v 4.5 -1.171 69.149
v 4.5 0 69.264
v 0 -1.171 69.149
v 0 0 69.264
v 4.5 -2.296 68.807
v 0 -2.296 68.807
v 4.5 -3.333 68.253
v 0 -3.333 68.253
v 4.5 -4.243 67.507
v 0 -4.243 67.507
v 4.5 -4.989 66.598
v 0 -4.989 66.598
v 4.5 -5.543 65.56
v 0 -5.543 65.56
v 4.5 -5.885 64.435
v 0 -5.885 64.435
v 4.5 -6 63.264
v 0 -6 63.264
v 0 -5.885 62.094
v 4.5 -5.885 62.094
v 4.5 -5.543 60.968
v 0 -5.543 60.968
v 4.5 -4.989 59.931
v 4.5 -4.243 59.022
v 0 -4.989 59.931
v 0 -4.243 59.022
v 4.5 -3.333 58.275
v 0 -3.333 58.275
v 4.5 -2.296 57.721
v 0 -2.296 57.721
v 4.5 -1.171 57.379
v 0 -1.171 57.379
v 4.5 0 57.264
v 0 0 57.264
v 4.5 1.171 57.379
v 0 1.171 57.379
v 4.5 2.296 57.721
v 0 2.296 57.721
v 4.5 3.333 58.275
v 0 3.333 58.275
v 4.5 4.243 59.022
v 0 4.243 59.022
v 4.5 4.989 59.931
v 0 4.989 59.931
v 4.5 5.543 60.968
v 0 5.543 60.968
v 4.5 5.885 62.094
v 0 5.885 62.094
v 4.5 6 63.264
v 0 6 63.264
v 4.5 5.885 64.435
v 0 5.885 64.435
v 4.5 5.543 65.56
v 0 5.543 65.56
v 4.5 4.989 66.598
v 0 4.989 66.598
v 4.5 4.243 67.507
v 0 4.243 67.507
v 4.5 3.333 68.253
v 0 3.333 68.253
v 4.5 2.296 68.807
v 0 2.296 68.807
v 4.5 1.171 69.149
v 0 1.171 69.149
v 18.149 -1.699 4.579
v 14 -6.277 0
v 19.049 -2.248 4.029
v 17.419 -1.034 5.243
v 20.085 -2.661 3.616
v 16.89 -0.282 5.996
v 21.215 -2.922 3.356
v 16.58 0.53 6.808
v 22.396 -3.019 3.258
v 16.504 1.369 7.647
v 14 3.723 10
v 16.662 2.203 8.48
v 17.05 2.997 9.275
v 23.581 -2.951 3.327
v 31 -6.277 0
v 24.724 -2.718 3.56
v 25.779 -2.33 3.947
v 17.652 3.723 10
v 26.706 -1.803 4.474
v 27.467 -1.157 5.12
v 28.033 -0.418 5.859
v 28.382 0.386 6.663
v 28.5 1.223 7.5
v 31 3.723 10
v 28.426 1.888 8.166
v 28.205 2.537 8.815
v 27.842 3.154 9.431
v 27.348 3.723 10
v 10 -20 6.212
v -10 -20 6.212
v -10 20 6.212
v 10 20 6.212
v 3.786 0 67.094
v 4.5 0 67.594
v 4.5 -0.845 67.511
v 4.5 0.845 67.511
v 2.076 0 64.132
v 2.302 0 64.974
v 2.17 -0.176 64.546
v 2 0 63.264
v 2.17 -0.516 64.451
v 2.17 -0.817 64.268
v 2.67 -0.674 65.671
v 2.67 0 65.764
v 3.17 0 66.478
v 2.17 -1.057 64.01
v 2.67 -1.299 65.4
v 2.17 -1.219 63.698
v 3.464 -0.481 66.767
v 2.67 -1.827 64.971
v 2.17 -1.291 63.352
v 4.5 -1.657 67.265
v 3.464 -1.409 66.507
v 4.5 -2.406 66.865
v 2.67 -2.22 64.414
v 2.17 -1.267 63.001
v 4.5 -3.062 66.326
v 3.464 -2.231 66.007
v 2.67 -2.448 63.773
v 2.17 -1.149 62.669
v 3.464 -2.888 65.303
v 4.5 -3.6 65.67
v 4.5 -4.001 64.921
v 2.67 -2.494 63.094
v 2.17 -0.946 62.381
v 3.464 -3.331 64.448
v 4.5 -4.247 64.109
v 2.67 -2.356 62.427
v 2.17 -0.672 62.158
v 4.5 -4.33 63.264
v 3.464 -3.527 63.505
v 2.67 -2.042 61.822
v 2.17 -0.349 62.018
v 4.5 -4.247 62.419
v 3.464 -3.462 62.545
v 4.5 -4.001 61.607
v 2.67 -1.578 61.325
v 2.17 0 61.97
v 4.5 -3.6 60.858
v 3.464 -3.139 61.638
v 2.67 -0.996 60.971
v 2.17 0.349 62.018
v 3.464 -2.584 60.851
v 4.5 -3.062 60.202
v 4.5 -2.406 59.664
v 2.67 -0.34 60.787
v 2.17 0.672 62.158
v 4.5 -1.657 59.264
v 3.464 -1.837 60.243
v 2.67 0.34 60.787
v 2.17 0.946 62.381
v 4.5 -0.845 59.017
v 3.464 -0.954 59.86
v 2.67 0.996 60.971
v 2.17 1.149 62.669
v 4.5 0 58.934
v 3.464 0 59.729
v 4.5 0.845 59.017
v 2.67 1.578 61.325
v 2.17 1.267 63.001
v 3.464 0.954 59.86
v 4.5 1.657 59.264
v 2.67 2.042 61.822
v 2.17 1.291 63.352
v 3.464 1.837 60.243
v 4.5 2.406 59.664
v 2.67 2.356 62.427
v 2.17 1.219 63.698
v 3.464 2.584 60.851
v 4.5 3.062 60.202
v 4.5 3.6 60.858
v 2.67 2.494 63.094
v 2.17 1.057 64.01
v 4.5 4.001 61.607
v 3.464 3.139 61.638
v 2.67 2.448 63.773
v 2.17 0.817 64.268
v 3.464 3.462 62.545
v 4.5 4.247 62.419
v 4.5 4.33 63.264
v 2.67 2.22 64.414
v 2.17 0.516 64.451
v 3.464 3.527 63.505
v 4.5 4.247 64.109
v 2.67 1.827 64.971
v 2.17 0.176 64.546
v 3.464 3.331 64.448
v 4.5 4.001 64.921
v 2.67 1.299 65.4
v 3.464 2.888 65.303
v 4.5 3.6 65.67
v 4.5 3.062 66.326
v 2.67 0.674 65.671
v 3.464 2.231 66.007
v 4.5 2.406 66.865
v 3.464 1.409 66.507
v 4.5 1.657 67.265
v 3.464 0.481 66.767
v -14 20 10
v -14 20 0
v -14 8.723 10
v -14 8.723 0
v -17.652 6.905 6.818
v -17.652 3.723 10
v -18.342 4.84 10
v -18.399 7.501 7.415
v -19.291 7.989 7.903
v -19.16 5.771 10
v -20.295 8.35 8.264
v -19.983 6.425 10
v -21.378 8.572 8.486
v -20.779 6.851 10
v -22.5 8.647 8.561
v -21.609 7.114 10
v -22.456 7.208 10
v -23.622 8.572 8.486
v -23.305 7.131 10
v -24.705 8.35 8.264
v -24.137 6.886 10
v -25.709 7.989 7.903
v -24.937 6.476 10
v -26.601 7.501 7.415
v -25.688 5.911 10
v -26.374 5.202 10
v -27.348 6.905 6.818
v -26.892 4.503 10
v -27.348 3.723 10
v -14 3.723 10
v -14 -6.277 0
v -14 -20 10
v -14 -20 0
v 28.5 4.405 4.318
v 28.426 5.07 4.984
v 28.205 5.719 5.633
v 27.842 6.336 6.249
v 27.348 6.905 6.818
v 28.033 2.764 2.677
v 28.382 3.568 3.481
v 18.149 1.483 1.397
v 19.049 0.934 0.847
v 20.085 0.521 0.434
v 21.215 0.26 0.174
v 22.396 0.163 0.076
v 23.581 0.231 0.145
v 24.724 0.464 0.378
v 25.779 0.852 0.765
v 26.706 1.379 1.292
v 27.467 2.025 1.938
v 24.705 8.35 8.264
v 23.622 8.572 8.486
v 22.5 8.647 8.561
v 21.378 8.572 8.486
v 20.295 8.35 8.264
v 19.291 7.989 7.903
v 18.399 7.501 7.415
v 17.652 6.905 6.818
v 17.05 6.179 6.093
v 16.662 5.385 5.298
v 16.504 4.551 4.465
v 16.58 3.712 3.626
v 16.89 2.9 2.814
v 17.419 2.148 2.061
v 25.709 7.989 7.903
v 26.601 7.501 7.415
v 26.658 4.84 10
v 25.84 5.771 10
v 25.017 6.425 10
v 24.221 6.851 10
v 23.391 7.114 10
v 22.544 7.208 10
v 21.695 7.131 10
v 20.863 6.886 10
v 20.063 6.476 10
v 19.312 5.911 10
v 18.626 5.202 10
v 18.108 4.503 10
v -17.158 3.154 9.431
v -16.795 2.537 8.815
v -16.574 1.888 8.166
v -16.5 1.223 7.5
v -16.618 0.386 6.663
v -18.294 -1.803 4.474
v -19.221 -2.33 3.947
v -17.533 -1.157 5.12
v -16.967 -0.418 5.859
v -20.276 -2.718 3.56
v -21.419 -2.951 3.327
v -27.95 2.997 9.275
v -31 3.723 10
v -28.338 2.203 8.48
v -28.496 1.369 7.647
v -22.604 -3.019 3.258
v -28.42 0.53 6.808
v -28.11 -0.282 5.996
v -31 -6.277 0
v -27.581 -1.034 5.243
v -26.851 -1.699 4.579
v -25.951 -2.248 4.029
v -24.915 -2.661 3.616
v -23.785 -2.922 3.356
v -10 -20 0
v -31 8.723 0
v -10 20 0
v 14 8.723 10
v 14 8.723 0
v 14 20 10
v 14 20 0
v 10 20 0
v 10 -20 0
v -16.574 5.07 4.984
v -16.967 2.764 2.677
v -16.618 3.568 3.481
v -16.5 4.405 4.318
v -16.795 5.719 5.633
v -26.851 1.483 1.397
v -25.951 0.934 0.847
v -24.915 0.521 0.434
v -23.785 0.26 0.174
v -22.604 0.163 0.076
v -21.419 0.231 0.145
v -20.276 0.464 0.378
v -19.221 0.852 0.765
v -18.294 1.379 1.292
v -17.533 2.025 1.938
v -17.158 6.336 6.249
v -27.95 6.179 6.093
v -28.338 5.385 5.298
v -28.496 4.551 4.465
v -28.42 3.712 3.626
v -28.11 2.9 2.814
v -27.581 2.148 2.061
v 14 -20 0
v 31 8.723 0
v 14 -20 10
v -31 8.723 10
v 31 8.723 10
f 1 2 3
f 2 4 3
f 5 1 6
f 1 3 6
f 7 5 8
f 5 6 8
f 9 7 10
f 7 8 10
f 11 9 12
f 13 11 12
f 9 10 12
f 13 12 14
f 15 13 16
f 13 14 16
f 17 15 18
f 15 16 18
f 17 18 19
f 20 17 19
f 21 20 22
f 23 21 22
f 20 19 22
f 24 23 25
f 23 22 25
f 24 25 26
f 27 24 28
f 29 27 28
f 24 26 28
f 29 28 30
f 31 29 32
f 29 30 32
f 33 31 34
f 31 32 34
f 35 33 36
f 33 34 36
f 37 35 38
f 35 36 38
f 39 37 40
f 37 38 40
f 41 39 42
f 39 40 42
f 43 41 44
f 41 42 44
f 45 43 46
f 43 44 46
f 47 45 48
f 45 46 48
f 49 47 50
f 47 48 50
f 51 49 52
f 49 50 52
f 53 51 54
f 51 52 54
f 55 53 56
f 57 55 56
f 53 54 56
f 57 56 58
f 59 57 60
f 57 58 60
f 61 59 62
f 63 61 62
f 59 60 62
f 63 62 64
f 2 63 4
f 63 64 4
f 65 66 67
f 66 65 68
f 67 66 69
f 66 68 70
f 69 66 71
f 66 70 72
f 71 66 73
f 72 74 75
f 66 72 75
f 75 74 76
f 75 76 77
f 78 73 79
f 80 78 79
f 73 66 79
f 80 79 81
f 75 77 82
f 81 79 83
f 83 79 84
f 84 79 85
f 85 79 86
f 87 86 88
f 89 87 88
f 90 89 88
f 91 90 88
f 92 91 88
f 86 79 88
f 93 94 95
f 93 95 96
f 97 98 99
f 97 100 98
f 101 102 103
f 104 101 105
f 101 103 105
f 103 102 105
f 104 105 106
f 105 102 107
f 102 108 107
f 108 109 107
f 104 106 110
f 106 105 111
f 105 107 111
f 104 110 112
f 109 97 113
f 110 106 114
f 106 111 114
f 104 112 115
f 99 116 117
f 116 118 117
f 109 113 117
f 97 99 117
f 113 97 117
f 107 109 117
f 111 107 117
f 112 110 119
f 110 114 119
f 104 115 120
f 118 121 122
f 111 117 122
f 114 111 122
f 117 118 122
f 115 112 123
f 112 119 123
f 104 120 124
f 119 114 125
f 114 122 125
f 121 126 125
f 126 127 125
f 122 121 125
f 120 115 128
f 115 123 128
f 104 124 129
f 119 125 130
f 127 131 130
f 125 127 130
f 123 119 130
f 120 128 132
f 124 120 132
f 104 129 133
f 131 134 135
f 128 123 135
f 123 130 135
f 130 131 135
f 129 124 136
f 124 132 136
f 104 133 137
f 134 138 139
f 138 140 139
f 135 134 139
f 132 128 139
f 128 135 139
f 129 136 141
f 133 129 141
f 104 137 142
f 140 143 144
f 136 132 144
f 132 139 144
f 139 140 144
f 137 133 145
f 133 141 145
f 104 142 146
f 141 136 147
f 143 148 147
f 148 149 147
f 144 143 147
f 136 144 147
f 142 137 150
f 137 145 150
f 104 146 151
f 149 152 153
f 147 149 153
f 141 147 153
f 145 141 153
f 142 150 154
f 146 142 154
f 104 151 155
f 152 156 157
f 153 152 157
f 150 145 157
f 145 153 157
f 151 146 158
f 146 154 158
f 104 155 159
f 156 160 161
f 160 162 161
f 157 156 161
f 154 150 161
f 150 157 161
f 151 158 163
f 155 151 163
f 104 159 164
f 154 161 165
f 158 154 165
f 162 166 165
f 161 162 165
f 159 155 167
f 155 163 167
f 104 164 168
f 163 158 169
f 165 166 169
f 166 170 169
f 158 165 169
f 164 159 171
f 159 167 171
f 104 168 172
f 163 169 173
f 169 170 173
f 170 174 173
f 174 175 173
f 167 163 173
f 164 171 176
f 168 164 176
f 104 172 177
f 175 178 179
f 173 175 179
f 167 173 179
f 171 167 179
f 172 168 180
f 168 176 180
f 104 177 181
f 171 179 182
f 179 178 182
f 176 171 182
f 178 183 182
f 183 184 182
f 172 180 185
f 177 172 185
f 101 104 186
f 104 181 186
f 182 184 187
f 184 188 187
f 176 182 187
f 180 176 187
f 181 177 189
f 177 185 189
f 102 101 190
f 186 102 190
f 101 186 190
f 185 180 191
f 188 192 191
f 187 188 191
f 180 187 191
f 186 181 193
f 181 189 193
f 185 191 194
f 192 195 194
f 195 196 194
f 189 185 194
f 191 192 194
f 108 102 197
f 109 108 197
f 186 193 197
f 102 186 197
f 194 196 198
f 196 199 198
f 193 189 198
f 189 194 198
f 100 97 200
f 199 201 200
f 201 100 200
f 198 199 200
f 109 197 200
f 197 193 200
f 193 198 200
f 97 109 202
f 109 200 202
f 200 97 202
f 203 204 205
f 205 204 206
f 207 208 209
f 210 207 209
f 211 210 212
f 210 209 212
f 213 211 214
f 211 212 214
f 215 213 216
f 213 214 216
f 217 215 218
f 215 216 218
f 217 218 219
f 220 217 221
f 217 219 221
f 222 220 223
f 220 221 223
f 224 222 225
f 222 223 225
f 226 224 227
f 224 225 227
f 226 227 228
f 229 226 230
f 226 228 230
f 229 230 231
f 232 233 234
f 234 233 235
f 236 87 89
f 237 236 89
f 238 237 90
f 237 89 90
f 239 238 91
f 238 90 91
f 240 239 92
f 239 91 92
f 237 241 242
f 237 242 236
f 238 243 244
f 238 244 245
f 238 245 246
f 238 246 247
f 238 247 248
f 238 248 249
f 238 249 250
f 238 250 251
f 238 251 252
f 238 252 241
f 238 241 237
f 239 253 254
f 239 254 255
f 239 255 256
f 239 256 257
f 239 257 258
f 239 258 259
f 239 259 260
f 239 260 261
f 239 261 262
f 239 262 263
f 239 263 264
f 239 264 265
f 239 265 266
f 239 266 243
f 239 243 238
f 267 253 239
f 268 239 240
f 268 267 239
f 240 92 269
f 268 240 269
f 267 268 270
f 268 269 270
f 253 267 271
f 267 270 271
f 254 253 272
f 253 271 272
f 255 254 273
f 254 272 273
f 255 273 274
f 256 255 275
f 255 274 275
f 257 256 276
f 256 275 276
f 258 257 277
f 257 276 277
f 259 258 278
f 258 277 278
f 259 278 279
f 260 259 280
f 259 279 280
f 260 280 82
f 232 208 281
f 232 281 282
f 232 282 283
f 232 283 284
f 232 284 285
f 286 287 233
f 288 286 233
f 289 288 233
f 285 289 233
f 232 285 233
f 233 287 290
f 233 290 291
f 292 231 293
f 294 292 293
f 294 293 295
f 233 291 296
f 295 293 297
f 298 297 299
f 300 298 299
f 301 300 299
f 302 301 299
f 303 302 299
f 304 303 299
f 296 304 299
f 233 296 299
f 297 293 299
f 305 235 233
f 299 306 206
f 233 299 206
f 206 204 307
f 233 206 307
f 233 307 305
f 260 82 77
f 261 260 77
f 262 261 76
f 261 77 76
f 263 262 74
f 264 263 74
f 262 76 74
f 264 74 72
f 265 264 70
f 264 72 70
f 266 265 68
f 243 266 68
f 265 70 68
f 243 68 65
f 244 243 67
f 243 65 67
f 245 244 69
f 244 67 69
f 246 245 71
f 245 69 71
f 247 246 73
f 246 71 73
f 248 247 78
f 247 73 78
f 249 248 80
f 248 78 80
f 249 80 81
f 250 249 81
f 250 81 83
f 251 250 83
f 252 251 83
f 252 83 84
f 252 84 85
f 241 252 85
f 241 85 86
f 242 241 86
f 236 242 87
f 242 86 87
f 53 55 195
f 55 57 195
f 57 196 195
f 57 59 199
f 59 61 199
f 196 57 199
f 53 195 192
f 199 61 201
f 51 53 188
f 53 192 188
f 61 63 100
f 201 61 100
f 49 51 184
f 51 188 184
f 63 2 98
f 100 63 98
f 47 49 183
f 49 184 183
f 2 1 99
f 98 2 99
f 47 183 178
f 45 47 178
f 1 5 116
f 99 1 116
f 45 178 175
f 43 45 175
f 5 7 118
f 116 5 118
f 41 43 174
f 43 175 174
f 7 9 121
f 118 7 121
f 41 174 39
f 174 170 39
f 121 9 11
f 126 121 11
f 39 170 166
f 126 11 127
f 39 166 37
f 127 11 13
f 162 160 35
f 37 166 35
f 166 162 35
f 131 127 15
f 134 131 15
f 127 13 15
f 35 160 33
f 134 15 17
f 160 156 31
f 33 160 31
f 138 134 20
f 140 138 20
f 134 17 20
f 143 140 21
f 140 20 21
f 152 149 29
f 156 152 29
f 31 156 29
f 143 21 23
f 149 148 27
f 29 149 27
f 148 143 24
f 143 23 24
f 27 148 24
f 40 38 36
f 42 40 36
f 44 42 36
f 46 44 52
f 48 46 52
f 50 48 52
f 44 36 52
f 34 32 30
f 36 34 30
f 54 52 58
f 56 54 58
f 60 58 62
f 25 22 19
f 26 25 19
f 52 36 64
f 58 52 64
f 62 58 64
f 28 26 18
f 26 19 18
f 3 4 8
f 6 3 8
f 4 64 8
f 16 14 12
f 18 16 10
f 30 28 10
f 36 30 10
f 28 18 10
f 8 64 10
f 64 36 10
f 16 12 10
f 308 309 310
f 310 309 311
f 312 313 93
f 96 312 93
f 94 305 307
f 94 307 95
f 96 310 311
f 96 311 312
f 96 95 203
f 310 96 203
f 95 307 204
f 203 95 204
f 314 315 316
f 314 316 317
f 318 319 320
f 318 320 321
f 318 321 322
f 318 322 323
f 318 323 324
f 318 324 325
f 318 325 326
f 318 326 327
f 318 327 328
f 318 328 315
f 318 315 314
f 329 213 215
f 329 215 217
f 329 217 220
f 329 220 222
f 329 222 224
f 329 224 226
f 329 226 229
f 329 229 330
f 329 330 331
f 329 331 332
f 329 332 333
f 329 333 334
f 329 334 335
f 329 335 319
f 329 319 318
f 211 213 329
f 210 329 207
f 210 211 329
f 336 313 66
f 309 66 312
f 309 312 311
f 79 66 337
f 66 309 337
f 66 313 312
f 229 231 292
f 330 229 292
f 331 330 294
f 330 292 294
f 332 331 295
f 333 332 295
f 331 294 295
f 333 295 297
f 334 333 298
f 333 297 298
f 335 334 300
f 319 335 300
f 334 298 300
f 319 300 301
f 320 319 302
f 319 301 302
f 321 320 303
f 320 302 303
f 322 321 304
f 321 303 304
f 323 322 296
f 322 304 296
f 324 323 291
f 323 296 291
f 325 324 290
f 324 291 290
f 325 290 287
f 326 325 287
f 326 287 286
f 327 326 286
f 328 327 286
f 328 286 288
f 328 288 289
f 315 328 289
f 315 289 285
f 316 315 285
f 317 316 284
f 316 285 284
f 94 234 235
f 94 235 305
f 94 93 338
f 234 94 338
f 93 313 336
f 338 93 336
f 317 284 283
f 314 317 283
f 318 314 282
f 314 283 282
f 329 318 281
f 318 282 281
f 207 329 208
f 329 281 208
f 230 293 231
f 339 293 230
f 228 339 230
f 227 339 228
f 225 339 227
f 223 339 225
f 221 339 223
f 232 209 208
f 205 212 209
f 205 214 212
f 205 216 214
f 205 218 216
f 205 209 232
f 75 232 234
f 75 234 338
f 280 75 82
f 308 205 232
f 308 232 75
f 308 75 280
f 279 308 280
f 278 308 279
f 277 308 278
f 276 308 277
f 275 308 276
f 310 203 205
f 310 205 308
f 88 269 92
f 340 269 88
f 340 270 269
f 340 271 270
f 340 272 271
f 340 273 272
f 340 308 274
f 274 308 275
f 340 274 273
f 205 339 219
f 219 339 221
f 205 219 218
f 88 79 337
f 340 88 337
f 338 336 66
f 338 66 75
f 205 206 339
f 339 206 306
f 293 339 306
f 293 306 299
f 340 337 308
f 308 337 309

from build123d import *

# Parameters (mm, degrees)
F1_DEPTH  = 10
F2_W      = 20
F2_H      = 6.2118896035
F3_DEPTH  = 40.001
F5_DEPTH  = 17
F7_DEPTH  = 4.5
F9_DEPTH  = 17
F11_DEPTH = 4.5


with BuildPart() as f1:
    # F0 (on Top) → F1 (new body)
    with BuildSketch(Plane.XY):
        Polygon((14, 8.7225403264), (14, 20), (-14, 20), (-14, 8.7225403264), (-31, 8.7225403264), (-31, -6.2774596736), (-14, -6.2774596736), (-14, -20), (14, -20), (14, -6.2774596736), (31, -6.2774596736), (31, 8.7225403264), align=None)
    extrude(amount=F1_DEPTH)

    # F2 (on face) → F3 (cut, through all)
    with BuildSketch(Plane.XZ.offset(20)):
        with Locations((0, 3.1059448017)):
            Rectangle(F2_W, F2_H)
    extrude(amount=-F3_DEPTH, mode=Mode.SUBTRACT)

    # F4 (on face) → F5 (cut)
    with BuildSketch(Plane.YZ.offset(31)):
        Polygon((-6.2774596736, 10), (-6.2774596736, 0), (1.2225403264, 7.5), (3.7225403264, 10), align=None)
    extrude(amount=-F5_DEPTH, mode=Mode.SUBTRACT)

    # F6 (on face) → F7 (cut)
    with BuildSketch(Plane(origin=(0, -3.1387298368, 3.1387298368), x_dir=(1, 0, 0), z_dir=(0, -0.7071067812, 0.7071067812))):
        with BuildLine():
            ThreePointArc((28.5, 6.1677713199), (28.2046514458, 8.0270593239), (27.3476827061, 9.7033013199))
            Line((27.3476827061, 9.7033013199), (17.6523172939, 9.7033013199))
            ThreePointArc((17.6523172939, 9.7033013199), (20.640711996, 0.4631198741), (28.5, 6.1677713199))
        make_face()
        with BuildLine():
            Line((17.6523172939, 9.7033013199), (27.3476827061, 9.7033013199))
            ThreePointArc((27.3476827061, 9.7033013199), (22.5, 12.1677713199), (17.6523172939, 9.7033013199))
        make_face()
    extrude(amount=-F7_DEPTH, mode=Mode.SUBTRACT)

    # F8 (on face) → F9 (cut)
    with BuildSketch(Plane(origin=(-31, 0, 0), x_dir=(0, -1, 0), z_dir=(-1, 0, 0))):
        Polygon((-1.2225403264, 7.5), (6.2774596736, 0), (6.2774596736, 10), (-3.7225403264, 10), align=None)
    extrude(amount=-F9_DEPTH, mode=Mode.SUBTRACT)

    # F10 (on face) → F11 (cut)
    with BuildSketch(Plane(origin=(0, -3.1387298368, 3.1387298368), x_dir=(1, 0, 0), z_dir=(0, -0.7071067812, 0.7071067812))):
        with BuildLine():
            Line((-27.3476827061, 9.7033013199), (-17.6523172939, 9.7033013199))
            ThreePointArc((-17.6523172939, 9.7033013199), (-22.5, 12.1677713199), (-27.3476827061, 9.7033013199))
        make_face()
        with BuildLine():
            ThreePointArc((-27.3476827061, 9.7033013199), (-24.359288004, 0.4631198741), (-16.5, 6.1677713199))
            ThreePointArc((-16.5, 6.1677713199), (-16.7953485542, 8.0270593239), (-17.6523172939, 9.7033013199))
            Line((-17.6523172939, 9.7033013199), (-27.3476827061, 9.7033013199))
        make_face()
    extrude(amount=-F11_DEPTH, mode=Mode.SUBTRACT)


with BuildPart() as f13:
    # F12 (on Front) → F13 (revolve)
    with BuildSketch(Plane.XZ):
        with BuildLine():
            Line((4.5, 69.2641640902), (0, 69.2641640902))
            Line((0, 69.2641640902), (0, 63.2641640902))
            Line((0, 63.2641640902), (2, 63.2641640902))
            ThreePointArc((2, 63.2641640902), (2.6698729811, 65.7641640902), (4.5, 67.5942911091))
            Line((4.5, 67.5942911091), (4.5, 69.2641640902))
        make_face()
    revolve(axis=Axis((1, 0, 63.2641640902), (1, 0, 0)))


solid = Compound([f1.part, f13.part])
